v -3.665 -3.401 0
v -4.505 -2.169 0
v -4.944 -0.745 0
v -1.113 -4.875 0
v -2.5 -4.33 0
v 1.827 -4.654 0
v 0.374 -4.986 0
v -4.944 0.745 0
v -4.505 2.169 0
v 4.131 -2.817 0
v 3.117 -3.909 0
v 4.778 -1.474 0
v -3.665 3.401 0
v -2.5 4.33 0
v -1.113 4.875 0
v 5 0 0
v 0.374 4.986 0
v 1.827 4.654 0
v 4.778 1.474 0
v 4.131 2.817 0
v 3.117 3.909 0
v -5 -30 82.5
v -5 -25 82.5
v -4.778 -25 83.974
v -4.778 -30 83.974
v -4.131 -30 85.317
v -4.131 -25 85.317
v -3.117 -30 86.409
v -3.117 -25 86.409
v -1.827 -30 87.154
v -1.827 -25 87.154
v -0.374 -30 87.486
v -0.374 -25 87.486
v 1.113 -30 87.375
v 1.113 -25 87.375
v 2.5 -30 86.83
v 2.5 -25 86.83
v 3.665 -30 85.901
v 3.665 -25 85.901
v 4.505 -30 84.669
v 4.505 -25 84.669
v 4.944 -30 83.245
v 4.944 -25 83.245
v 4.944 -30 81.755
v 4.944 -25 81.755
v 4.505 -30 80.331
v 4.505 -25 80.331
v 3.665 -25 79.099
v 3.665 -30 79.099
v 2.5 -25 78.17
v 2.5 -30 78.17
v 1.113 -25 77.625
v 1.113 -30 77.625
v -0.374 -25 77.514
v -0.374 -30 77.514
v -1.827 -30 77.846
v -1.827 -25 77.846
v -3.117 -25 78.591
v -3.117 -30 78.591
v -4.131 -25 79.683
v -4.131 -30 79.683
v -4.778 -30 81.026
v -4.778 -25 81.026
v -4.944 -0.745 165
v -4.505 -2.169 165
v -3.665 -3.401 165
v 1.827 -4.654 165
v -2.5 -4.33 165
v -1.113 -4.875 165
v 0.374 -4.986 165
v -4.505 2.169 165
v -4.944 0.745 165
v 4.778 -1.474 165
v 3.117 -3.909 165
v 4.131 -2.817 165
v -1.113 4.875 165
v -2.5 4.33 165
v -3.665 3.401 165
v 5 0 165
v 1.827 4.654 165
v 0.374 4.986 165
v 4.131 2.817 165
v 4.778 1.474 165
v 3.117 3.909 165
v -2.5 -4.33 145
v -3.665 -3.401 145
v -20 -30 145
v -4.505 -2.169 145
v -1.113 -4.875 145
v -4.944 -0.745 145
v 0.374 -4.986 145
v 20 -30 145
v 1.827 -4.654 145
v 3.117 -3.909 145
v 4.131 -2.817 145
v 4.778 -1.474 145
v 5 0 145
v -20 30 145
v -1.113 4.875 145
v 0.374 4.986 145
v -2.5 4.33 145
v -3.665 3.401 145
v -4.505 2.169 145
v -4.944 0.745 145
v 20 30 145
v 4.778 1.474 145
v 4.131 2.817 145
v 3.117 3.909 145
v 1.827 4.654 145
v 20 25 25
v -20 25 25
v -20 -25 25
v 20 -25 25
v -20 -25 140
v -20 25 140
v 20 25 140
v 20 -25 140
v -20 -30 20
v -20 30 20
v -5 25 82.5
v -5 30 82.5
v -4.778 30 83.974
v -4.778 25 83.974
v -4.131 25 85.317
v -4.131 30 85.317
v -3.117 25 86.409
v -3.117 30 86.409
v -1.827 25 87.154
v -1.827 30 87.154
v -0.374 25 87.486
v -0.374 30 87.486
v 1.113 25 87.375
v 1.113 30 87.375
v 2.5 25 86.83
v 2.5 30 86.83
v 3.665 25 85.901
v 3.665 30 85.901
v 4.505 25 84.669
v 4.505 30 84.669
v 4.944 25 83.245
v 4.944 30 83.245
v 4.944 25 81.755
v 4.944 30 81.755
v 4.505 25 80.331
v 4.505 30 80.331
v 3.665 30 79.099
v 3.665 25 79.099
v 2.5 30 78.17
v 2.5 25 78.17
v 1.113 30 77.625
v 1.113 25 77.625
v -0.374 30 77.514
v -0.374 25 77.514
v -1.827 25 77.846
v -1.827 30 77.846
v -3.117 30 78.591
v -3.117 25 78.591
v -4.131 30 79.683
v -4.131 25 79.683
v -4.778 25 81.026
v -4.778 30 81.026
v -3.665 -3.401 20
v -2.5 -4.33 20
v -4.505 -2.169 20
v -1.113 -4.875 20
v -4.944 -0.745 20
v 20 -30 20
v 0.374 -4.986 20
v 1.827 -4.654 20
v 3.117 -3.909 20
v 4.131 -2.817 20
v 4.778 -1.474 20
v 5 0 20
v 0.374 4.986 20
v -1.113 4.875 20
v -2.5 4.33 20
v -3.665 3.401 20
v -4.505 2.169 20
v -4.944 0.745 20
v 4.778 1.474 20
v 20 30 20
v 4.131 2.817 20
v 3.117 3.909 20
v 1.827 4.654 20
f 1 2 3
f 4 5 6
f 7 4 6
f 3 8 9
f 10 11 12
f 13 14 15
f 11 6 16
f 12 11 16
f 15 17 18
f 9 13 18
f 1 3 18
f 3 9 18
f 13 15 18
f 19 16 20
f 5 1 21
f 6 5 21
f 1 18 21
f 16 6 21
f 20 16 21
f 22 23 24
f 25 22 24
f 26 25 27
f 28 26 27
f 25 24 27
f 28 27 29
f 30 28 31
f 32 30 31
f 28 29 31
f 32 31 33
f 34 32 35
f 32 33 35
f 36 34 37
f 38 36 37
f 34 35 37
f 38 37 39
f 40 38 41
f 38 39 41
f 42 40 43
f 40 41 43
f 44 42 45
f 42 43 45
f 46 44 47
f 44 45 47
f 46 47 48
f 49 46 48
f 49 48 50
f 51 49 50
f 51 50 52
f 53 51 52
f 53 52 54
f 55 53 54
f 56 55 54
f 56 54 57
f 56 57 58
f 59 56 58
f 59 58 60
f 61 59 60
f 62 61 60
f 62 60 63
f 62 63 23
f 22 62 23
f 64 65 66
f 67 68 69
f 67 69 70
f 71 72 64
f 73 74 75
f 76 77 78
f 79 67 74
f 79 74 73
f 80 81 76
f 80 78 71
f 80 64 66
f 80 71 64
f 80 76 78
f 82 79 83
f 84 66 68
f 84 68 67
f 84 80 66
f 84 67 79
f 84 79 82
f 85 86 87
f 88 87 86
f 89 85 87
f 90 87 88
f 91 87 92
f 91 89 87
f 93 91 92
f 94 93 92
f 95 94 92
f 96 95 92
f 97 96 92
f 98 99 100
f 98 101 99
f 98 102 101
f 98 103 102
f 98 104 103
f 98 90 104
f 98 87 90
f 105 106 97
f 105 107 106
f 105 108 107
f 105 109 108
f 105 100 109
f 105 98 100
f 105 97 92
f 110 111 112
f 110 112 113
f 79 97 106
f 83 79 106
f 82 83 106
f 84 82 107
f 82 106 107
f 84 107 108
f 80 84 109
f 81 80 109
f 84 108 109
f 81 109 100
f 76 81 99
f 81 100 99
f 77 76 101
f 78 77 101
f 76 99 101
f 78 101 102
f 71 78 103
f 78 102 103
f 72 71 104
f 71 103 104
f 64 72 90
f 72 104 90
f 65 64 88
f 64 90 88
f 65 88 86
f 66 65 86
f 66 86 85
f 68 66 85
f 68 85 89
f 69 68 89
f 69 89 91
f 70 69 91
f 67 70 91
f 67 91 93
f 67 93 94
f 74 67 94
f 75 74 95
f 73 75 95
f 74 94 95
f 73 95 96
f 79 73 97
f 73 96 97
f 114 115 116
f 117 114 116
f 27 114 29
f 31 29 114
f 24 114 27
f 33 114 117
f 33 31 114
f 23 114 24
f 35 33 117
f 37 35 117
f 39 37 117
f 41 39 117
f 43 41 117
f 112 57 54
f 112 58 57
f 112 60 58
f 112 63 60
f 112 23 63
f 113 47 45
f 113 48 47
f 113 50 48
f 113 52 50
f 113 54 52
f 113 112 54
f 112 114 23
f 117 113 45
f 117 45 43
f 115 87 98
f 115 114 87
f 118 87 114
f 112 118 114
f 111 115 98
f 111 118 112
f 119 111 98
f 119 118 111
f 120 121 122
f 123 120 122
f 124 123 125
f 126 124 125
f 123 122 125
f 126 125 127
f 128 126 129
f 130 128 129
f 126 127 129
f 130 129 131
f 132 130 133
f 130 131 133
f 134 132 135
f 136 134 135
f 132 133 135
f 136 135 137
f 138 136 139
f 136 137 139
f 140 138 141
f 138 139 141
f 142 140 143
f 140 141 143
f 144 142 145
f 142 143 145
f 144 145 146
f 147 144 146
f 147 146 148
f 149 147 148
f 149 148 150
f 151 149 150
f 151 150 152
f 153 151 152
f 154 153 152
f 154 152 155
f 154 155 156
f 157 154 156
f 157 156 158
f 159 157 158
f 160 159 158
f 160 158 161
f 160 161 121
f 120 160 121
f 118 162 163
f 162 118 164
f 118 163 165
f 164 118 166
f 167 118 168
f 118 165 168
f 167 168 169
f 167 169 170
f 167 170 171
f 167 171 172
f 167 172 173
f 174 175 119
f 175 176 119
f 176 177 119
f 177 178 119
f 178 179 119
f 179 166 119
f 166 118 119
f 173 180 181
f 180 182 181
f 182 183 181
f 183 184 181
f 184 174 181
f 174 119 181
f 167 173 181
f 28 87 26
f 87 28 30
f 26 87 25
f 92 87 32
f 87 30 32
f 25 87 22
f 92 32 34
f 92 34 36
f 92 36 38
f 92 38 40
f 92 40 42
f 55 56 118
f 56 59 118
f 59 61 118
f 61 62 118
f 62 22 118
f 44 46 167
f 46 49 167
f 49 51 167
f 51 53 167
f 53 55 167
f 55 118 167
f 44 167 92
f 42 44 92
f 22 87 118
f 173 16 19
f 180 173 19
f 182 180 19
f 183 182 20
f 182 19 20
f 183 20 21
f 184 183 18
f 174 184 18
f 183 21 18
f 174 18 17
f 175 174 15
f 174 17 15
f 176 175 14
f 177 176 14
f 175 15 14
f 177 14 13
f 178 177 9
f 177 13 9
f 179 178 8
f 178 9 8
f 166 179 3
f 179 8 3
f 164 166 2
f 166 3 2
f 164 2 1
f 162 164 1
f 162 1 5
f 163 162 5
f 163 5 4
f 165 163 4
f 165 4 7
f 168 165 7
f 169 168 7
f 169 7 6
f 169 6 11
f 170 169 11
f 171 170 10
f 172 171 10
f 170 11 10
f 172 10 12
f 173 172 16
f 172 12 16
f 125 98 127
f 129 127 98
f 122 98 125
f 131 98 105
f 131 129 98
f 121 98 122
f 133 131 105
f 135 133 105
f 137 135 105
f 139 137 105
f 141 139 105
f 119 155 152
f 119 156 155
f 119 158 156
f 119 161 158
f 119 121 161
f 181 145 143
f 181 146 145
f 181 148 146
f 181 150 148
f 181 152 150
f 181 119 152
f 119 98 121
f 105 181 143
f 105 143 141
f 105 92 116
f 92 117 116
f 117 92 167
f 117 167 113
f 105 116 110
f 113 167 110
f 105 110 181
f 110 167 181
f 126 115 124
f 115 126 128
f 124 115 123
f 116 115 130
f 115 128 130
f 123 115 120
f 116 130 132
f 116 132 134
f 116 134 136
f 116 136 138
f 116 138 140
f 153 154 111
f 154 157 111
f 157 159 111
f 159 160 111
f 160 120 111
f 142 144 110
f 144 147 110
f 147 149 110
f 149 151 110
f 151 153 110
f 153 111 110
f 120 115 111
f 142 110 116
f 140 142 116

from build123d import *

# Parameters (mm, degrees)
SKETCH_1_R          = 5
EXTRUDE_1_DEPTH     = 20
SKETCH_2_W          = 40
SKETCH_2_H          = 60
EXTRUDE_2_DEPTH     = 5
SKETCH_3_W          = 40
SKETCH_3_H          = 5
EXTRUDE_3_DEPTH     = 115
SKETCH_4_W          = 40
SKETCH_4_H          = 60
EXTRUDE_4_DEPTH     = 5
SKETCH_5_R          = 5
EXTRUDE_5_DEPTH     = 20
SKETCH_6_R          = 5
CUT_EXTRUDE_1_DEPTH = 241


with BuildPart() as part:
    # Эскиз1 → Бобышка-Вытянуть1 (new body)
    with BuildSketch(Plane.XY):
        Circle(SKETCH_1_R)
    extrude(amount=EXTRUDE_1_DEPTH)

    # Эскиз2 → Бобышка-Вытянуть2 (add)
    with BuildSketch(Plane.XY.offset(20)):
        Rectangle(SKETCH_2_W, SKETCH_2_H)
    extrude(amount=EXTRUDE_2_DEPTH)

    # Эскиз3 → Бобышка-Вытянуть3 (add)
    with BuildSketch(Plane.XY.offset(25)):
        with Locations((0, 27.5)):
            Rectangle(SKETCH_3_W, SKETCH_3_H)
        with Locations((0, -27.5)):
            Rectangle(SKETCH_3_W, SKETCH_3_H)
    extrude(amount=EXTRUDE_3_DEPTH)

    # Эскиз4 → Бобышка-Вытянуть4 (add)
    with BuildSketch(Plane.XY.offset(140)):
        Rectangle(SKETCH_4_W, SKETCH_4_H)
    extrude(amount=EXTRUDE_4_DEPTH)

    # Эскиз5 → Бобышка-Вытянуть5 (add)
    with BuildSketch(Plane.XY.offset(145)):
        Circle(SKETCH_5_R)
    extrude(amount=EXTRUDE_5_DEPTH)

    # Эскиз6 → Вырез-Вытянуть1 (cut)
    with BuildSketch(Plane(origin=(0, 30, 0), x_dir=(1, 0, 0), z_dir=(0, 1, 0))):
        with Locations(Location((0, -82.5, 0), (0, 0, 180))):
            Circle(SKETCH_6_R)
    extrude(amount=-CUT_EXTRUDE_1_DEPTH, mode=Mode.SUBTRACT)


solid = part.part
